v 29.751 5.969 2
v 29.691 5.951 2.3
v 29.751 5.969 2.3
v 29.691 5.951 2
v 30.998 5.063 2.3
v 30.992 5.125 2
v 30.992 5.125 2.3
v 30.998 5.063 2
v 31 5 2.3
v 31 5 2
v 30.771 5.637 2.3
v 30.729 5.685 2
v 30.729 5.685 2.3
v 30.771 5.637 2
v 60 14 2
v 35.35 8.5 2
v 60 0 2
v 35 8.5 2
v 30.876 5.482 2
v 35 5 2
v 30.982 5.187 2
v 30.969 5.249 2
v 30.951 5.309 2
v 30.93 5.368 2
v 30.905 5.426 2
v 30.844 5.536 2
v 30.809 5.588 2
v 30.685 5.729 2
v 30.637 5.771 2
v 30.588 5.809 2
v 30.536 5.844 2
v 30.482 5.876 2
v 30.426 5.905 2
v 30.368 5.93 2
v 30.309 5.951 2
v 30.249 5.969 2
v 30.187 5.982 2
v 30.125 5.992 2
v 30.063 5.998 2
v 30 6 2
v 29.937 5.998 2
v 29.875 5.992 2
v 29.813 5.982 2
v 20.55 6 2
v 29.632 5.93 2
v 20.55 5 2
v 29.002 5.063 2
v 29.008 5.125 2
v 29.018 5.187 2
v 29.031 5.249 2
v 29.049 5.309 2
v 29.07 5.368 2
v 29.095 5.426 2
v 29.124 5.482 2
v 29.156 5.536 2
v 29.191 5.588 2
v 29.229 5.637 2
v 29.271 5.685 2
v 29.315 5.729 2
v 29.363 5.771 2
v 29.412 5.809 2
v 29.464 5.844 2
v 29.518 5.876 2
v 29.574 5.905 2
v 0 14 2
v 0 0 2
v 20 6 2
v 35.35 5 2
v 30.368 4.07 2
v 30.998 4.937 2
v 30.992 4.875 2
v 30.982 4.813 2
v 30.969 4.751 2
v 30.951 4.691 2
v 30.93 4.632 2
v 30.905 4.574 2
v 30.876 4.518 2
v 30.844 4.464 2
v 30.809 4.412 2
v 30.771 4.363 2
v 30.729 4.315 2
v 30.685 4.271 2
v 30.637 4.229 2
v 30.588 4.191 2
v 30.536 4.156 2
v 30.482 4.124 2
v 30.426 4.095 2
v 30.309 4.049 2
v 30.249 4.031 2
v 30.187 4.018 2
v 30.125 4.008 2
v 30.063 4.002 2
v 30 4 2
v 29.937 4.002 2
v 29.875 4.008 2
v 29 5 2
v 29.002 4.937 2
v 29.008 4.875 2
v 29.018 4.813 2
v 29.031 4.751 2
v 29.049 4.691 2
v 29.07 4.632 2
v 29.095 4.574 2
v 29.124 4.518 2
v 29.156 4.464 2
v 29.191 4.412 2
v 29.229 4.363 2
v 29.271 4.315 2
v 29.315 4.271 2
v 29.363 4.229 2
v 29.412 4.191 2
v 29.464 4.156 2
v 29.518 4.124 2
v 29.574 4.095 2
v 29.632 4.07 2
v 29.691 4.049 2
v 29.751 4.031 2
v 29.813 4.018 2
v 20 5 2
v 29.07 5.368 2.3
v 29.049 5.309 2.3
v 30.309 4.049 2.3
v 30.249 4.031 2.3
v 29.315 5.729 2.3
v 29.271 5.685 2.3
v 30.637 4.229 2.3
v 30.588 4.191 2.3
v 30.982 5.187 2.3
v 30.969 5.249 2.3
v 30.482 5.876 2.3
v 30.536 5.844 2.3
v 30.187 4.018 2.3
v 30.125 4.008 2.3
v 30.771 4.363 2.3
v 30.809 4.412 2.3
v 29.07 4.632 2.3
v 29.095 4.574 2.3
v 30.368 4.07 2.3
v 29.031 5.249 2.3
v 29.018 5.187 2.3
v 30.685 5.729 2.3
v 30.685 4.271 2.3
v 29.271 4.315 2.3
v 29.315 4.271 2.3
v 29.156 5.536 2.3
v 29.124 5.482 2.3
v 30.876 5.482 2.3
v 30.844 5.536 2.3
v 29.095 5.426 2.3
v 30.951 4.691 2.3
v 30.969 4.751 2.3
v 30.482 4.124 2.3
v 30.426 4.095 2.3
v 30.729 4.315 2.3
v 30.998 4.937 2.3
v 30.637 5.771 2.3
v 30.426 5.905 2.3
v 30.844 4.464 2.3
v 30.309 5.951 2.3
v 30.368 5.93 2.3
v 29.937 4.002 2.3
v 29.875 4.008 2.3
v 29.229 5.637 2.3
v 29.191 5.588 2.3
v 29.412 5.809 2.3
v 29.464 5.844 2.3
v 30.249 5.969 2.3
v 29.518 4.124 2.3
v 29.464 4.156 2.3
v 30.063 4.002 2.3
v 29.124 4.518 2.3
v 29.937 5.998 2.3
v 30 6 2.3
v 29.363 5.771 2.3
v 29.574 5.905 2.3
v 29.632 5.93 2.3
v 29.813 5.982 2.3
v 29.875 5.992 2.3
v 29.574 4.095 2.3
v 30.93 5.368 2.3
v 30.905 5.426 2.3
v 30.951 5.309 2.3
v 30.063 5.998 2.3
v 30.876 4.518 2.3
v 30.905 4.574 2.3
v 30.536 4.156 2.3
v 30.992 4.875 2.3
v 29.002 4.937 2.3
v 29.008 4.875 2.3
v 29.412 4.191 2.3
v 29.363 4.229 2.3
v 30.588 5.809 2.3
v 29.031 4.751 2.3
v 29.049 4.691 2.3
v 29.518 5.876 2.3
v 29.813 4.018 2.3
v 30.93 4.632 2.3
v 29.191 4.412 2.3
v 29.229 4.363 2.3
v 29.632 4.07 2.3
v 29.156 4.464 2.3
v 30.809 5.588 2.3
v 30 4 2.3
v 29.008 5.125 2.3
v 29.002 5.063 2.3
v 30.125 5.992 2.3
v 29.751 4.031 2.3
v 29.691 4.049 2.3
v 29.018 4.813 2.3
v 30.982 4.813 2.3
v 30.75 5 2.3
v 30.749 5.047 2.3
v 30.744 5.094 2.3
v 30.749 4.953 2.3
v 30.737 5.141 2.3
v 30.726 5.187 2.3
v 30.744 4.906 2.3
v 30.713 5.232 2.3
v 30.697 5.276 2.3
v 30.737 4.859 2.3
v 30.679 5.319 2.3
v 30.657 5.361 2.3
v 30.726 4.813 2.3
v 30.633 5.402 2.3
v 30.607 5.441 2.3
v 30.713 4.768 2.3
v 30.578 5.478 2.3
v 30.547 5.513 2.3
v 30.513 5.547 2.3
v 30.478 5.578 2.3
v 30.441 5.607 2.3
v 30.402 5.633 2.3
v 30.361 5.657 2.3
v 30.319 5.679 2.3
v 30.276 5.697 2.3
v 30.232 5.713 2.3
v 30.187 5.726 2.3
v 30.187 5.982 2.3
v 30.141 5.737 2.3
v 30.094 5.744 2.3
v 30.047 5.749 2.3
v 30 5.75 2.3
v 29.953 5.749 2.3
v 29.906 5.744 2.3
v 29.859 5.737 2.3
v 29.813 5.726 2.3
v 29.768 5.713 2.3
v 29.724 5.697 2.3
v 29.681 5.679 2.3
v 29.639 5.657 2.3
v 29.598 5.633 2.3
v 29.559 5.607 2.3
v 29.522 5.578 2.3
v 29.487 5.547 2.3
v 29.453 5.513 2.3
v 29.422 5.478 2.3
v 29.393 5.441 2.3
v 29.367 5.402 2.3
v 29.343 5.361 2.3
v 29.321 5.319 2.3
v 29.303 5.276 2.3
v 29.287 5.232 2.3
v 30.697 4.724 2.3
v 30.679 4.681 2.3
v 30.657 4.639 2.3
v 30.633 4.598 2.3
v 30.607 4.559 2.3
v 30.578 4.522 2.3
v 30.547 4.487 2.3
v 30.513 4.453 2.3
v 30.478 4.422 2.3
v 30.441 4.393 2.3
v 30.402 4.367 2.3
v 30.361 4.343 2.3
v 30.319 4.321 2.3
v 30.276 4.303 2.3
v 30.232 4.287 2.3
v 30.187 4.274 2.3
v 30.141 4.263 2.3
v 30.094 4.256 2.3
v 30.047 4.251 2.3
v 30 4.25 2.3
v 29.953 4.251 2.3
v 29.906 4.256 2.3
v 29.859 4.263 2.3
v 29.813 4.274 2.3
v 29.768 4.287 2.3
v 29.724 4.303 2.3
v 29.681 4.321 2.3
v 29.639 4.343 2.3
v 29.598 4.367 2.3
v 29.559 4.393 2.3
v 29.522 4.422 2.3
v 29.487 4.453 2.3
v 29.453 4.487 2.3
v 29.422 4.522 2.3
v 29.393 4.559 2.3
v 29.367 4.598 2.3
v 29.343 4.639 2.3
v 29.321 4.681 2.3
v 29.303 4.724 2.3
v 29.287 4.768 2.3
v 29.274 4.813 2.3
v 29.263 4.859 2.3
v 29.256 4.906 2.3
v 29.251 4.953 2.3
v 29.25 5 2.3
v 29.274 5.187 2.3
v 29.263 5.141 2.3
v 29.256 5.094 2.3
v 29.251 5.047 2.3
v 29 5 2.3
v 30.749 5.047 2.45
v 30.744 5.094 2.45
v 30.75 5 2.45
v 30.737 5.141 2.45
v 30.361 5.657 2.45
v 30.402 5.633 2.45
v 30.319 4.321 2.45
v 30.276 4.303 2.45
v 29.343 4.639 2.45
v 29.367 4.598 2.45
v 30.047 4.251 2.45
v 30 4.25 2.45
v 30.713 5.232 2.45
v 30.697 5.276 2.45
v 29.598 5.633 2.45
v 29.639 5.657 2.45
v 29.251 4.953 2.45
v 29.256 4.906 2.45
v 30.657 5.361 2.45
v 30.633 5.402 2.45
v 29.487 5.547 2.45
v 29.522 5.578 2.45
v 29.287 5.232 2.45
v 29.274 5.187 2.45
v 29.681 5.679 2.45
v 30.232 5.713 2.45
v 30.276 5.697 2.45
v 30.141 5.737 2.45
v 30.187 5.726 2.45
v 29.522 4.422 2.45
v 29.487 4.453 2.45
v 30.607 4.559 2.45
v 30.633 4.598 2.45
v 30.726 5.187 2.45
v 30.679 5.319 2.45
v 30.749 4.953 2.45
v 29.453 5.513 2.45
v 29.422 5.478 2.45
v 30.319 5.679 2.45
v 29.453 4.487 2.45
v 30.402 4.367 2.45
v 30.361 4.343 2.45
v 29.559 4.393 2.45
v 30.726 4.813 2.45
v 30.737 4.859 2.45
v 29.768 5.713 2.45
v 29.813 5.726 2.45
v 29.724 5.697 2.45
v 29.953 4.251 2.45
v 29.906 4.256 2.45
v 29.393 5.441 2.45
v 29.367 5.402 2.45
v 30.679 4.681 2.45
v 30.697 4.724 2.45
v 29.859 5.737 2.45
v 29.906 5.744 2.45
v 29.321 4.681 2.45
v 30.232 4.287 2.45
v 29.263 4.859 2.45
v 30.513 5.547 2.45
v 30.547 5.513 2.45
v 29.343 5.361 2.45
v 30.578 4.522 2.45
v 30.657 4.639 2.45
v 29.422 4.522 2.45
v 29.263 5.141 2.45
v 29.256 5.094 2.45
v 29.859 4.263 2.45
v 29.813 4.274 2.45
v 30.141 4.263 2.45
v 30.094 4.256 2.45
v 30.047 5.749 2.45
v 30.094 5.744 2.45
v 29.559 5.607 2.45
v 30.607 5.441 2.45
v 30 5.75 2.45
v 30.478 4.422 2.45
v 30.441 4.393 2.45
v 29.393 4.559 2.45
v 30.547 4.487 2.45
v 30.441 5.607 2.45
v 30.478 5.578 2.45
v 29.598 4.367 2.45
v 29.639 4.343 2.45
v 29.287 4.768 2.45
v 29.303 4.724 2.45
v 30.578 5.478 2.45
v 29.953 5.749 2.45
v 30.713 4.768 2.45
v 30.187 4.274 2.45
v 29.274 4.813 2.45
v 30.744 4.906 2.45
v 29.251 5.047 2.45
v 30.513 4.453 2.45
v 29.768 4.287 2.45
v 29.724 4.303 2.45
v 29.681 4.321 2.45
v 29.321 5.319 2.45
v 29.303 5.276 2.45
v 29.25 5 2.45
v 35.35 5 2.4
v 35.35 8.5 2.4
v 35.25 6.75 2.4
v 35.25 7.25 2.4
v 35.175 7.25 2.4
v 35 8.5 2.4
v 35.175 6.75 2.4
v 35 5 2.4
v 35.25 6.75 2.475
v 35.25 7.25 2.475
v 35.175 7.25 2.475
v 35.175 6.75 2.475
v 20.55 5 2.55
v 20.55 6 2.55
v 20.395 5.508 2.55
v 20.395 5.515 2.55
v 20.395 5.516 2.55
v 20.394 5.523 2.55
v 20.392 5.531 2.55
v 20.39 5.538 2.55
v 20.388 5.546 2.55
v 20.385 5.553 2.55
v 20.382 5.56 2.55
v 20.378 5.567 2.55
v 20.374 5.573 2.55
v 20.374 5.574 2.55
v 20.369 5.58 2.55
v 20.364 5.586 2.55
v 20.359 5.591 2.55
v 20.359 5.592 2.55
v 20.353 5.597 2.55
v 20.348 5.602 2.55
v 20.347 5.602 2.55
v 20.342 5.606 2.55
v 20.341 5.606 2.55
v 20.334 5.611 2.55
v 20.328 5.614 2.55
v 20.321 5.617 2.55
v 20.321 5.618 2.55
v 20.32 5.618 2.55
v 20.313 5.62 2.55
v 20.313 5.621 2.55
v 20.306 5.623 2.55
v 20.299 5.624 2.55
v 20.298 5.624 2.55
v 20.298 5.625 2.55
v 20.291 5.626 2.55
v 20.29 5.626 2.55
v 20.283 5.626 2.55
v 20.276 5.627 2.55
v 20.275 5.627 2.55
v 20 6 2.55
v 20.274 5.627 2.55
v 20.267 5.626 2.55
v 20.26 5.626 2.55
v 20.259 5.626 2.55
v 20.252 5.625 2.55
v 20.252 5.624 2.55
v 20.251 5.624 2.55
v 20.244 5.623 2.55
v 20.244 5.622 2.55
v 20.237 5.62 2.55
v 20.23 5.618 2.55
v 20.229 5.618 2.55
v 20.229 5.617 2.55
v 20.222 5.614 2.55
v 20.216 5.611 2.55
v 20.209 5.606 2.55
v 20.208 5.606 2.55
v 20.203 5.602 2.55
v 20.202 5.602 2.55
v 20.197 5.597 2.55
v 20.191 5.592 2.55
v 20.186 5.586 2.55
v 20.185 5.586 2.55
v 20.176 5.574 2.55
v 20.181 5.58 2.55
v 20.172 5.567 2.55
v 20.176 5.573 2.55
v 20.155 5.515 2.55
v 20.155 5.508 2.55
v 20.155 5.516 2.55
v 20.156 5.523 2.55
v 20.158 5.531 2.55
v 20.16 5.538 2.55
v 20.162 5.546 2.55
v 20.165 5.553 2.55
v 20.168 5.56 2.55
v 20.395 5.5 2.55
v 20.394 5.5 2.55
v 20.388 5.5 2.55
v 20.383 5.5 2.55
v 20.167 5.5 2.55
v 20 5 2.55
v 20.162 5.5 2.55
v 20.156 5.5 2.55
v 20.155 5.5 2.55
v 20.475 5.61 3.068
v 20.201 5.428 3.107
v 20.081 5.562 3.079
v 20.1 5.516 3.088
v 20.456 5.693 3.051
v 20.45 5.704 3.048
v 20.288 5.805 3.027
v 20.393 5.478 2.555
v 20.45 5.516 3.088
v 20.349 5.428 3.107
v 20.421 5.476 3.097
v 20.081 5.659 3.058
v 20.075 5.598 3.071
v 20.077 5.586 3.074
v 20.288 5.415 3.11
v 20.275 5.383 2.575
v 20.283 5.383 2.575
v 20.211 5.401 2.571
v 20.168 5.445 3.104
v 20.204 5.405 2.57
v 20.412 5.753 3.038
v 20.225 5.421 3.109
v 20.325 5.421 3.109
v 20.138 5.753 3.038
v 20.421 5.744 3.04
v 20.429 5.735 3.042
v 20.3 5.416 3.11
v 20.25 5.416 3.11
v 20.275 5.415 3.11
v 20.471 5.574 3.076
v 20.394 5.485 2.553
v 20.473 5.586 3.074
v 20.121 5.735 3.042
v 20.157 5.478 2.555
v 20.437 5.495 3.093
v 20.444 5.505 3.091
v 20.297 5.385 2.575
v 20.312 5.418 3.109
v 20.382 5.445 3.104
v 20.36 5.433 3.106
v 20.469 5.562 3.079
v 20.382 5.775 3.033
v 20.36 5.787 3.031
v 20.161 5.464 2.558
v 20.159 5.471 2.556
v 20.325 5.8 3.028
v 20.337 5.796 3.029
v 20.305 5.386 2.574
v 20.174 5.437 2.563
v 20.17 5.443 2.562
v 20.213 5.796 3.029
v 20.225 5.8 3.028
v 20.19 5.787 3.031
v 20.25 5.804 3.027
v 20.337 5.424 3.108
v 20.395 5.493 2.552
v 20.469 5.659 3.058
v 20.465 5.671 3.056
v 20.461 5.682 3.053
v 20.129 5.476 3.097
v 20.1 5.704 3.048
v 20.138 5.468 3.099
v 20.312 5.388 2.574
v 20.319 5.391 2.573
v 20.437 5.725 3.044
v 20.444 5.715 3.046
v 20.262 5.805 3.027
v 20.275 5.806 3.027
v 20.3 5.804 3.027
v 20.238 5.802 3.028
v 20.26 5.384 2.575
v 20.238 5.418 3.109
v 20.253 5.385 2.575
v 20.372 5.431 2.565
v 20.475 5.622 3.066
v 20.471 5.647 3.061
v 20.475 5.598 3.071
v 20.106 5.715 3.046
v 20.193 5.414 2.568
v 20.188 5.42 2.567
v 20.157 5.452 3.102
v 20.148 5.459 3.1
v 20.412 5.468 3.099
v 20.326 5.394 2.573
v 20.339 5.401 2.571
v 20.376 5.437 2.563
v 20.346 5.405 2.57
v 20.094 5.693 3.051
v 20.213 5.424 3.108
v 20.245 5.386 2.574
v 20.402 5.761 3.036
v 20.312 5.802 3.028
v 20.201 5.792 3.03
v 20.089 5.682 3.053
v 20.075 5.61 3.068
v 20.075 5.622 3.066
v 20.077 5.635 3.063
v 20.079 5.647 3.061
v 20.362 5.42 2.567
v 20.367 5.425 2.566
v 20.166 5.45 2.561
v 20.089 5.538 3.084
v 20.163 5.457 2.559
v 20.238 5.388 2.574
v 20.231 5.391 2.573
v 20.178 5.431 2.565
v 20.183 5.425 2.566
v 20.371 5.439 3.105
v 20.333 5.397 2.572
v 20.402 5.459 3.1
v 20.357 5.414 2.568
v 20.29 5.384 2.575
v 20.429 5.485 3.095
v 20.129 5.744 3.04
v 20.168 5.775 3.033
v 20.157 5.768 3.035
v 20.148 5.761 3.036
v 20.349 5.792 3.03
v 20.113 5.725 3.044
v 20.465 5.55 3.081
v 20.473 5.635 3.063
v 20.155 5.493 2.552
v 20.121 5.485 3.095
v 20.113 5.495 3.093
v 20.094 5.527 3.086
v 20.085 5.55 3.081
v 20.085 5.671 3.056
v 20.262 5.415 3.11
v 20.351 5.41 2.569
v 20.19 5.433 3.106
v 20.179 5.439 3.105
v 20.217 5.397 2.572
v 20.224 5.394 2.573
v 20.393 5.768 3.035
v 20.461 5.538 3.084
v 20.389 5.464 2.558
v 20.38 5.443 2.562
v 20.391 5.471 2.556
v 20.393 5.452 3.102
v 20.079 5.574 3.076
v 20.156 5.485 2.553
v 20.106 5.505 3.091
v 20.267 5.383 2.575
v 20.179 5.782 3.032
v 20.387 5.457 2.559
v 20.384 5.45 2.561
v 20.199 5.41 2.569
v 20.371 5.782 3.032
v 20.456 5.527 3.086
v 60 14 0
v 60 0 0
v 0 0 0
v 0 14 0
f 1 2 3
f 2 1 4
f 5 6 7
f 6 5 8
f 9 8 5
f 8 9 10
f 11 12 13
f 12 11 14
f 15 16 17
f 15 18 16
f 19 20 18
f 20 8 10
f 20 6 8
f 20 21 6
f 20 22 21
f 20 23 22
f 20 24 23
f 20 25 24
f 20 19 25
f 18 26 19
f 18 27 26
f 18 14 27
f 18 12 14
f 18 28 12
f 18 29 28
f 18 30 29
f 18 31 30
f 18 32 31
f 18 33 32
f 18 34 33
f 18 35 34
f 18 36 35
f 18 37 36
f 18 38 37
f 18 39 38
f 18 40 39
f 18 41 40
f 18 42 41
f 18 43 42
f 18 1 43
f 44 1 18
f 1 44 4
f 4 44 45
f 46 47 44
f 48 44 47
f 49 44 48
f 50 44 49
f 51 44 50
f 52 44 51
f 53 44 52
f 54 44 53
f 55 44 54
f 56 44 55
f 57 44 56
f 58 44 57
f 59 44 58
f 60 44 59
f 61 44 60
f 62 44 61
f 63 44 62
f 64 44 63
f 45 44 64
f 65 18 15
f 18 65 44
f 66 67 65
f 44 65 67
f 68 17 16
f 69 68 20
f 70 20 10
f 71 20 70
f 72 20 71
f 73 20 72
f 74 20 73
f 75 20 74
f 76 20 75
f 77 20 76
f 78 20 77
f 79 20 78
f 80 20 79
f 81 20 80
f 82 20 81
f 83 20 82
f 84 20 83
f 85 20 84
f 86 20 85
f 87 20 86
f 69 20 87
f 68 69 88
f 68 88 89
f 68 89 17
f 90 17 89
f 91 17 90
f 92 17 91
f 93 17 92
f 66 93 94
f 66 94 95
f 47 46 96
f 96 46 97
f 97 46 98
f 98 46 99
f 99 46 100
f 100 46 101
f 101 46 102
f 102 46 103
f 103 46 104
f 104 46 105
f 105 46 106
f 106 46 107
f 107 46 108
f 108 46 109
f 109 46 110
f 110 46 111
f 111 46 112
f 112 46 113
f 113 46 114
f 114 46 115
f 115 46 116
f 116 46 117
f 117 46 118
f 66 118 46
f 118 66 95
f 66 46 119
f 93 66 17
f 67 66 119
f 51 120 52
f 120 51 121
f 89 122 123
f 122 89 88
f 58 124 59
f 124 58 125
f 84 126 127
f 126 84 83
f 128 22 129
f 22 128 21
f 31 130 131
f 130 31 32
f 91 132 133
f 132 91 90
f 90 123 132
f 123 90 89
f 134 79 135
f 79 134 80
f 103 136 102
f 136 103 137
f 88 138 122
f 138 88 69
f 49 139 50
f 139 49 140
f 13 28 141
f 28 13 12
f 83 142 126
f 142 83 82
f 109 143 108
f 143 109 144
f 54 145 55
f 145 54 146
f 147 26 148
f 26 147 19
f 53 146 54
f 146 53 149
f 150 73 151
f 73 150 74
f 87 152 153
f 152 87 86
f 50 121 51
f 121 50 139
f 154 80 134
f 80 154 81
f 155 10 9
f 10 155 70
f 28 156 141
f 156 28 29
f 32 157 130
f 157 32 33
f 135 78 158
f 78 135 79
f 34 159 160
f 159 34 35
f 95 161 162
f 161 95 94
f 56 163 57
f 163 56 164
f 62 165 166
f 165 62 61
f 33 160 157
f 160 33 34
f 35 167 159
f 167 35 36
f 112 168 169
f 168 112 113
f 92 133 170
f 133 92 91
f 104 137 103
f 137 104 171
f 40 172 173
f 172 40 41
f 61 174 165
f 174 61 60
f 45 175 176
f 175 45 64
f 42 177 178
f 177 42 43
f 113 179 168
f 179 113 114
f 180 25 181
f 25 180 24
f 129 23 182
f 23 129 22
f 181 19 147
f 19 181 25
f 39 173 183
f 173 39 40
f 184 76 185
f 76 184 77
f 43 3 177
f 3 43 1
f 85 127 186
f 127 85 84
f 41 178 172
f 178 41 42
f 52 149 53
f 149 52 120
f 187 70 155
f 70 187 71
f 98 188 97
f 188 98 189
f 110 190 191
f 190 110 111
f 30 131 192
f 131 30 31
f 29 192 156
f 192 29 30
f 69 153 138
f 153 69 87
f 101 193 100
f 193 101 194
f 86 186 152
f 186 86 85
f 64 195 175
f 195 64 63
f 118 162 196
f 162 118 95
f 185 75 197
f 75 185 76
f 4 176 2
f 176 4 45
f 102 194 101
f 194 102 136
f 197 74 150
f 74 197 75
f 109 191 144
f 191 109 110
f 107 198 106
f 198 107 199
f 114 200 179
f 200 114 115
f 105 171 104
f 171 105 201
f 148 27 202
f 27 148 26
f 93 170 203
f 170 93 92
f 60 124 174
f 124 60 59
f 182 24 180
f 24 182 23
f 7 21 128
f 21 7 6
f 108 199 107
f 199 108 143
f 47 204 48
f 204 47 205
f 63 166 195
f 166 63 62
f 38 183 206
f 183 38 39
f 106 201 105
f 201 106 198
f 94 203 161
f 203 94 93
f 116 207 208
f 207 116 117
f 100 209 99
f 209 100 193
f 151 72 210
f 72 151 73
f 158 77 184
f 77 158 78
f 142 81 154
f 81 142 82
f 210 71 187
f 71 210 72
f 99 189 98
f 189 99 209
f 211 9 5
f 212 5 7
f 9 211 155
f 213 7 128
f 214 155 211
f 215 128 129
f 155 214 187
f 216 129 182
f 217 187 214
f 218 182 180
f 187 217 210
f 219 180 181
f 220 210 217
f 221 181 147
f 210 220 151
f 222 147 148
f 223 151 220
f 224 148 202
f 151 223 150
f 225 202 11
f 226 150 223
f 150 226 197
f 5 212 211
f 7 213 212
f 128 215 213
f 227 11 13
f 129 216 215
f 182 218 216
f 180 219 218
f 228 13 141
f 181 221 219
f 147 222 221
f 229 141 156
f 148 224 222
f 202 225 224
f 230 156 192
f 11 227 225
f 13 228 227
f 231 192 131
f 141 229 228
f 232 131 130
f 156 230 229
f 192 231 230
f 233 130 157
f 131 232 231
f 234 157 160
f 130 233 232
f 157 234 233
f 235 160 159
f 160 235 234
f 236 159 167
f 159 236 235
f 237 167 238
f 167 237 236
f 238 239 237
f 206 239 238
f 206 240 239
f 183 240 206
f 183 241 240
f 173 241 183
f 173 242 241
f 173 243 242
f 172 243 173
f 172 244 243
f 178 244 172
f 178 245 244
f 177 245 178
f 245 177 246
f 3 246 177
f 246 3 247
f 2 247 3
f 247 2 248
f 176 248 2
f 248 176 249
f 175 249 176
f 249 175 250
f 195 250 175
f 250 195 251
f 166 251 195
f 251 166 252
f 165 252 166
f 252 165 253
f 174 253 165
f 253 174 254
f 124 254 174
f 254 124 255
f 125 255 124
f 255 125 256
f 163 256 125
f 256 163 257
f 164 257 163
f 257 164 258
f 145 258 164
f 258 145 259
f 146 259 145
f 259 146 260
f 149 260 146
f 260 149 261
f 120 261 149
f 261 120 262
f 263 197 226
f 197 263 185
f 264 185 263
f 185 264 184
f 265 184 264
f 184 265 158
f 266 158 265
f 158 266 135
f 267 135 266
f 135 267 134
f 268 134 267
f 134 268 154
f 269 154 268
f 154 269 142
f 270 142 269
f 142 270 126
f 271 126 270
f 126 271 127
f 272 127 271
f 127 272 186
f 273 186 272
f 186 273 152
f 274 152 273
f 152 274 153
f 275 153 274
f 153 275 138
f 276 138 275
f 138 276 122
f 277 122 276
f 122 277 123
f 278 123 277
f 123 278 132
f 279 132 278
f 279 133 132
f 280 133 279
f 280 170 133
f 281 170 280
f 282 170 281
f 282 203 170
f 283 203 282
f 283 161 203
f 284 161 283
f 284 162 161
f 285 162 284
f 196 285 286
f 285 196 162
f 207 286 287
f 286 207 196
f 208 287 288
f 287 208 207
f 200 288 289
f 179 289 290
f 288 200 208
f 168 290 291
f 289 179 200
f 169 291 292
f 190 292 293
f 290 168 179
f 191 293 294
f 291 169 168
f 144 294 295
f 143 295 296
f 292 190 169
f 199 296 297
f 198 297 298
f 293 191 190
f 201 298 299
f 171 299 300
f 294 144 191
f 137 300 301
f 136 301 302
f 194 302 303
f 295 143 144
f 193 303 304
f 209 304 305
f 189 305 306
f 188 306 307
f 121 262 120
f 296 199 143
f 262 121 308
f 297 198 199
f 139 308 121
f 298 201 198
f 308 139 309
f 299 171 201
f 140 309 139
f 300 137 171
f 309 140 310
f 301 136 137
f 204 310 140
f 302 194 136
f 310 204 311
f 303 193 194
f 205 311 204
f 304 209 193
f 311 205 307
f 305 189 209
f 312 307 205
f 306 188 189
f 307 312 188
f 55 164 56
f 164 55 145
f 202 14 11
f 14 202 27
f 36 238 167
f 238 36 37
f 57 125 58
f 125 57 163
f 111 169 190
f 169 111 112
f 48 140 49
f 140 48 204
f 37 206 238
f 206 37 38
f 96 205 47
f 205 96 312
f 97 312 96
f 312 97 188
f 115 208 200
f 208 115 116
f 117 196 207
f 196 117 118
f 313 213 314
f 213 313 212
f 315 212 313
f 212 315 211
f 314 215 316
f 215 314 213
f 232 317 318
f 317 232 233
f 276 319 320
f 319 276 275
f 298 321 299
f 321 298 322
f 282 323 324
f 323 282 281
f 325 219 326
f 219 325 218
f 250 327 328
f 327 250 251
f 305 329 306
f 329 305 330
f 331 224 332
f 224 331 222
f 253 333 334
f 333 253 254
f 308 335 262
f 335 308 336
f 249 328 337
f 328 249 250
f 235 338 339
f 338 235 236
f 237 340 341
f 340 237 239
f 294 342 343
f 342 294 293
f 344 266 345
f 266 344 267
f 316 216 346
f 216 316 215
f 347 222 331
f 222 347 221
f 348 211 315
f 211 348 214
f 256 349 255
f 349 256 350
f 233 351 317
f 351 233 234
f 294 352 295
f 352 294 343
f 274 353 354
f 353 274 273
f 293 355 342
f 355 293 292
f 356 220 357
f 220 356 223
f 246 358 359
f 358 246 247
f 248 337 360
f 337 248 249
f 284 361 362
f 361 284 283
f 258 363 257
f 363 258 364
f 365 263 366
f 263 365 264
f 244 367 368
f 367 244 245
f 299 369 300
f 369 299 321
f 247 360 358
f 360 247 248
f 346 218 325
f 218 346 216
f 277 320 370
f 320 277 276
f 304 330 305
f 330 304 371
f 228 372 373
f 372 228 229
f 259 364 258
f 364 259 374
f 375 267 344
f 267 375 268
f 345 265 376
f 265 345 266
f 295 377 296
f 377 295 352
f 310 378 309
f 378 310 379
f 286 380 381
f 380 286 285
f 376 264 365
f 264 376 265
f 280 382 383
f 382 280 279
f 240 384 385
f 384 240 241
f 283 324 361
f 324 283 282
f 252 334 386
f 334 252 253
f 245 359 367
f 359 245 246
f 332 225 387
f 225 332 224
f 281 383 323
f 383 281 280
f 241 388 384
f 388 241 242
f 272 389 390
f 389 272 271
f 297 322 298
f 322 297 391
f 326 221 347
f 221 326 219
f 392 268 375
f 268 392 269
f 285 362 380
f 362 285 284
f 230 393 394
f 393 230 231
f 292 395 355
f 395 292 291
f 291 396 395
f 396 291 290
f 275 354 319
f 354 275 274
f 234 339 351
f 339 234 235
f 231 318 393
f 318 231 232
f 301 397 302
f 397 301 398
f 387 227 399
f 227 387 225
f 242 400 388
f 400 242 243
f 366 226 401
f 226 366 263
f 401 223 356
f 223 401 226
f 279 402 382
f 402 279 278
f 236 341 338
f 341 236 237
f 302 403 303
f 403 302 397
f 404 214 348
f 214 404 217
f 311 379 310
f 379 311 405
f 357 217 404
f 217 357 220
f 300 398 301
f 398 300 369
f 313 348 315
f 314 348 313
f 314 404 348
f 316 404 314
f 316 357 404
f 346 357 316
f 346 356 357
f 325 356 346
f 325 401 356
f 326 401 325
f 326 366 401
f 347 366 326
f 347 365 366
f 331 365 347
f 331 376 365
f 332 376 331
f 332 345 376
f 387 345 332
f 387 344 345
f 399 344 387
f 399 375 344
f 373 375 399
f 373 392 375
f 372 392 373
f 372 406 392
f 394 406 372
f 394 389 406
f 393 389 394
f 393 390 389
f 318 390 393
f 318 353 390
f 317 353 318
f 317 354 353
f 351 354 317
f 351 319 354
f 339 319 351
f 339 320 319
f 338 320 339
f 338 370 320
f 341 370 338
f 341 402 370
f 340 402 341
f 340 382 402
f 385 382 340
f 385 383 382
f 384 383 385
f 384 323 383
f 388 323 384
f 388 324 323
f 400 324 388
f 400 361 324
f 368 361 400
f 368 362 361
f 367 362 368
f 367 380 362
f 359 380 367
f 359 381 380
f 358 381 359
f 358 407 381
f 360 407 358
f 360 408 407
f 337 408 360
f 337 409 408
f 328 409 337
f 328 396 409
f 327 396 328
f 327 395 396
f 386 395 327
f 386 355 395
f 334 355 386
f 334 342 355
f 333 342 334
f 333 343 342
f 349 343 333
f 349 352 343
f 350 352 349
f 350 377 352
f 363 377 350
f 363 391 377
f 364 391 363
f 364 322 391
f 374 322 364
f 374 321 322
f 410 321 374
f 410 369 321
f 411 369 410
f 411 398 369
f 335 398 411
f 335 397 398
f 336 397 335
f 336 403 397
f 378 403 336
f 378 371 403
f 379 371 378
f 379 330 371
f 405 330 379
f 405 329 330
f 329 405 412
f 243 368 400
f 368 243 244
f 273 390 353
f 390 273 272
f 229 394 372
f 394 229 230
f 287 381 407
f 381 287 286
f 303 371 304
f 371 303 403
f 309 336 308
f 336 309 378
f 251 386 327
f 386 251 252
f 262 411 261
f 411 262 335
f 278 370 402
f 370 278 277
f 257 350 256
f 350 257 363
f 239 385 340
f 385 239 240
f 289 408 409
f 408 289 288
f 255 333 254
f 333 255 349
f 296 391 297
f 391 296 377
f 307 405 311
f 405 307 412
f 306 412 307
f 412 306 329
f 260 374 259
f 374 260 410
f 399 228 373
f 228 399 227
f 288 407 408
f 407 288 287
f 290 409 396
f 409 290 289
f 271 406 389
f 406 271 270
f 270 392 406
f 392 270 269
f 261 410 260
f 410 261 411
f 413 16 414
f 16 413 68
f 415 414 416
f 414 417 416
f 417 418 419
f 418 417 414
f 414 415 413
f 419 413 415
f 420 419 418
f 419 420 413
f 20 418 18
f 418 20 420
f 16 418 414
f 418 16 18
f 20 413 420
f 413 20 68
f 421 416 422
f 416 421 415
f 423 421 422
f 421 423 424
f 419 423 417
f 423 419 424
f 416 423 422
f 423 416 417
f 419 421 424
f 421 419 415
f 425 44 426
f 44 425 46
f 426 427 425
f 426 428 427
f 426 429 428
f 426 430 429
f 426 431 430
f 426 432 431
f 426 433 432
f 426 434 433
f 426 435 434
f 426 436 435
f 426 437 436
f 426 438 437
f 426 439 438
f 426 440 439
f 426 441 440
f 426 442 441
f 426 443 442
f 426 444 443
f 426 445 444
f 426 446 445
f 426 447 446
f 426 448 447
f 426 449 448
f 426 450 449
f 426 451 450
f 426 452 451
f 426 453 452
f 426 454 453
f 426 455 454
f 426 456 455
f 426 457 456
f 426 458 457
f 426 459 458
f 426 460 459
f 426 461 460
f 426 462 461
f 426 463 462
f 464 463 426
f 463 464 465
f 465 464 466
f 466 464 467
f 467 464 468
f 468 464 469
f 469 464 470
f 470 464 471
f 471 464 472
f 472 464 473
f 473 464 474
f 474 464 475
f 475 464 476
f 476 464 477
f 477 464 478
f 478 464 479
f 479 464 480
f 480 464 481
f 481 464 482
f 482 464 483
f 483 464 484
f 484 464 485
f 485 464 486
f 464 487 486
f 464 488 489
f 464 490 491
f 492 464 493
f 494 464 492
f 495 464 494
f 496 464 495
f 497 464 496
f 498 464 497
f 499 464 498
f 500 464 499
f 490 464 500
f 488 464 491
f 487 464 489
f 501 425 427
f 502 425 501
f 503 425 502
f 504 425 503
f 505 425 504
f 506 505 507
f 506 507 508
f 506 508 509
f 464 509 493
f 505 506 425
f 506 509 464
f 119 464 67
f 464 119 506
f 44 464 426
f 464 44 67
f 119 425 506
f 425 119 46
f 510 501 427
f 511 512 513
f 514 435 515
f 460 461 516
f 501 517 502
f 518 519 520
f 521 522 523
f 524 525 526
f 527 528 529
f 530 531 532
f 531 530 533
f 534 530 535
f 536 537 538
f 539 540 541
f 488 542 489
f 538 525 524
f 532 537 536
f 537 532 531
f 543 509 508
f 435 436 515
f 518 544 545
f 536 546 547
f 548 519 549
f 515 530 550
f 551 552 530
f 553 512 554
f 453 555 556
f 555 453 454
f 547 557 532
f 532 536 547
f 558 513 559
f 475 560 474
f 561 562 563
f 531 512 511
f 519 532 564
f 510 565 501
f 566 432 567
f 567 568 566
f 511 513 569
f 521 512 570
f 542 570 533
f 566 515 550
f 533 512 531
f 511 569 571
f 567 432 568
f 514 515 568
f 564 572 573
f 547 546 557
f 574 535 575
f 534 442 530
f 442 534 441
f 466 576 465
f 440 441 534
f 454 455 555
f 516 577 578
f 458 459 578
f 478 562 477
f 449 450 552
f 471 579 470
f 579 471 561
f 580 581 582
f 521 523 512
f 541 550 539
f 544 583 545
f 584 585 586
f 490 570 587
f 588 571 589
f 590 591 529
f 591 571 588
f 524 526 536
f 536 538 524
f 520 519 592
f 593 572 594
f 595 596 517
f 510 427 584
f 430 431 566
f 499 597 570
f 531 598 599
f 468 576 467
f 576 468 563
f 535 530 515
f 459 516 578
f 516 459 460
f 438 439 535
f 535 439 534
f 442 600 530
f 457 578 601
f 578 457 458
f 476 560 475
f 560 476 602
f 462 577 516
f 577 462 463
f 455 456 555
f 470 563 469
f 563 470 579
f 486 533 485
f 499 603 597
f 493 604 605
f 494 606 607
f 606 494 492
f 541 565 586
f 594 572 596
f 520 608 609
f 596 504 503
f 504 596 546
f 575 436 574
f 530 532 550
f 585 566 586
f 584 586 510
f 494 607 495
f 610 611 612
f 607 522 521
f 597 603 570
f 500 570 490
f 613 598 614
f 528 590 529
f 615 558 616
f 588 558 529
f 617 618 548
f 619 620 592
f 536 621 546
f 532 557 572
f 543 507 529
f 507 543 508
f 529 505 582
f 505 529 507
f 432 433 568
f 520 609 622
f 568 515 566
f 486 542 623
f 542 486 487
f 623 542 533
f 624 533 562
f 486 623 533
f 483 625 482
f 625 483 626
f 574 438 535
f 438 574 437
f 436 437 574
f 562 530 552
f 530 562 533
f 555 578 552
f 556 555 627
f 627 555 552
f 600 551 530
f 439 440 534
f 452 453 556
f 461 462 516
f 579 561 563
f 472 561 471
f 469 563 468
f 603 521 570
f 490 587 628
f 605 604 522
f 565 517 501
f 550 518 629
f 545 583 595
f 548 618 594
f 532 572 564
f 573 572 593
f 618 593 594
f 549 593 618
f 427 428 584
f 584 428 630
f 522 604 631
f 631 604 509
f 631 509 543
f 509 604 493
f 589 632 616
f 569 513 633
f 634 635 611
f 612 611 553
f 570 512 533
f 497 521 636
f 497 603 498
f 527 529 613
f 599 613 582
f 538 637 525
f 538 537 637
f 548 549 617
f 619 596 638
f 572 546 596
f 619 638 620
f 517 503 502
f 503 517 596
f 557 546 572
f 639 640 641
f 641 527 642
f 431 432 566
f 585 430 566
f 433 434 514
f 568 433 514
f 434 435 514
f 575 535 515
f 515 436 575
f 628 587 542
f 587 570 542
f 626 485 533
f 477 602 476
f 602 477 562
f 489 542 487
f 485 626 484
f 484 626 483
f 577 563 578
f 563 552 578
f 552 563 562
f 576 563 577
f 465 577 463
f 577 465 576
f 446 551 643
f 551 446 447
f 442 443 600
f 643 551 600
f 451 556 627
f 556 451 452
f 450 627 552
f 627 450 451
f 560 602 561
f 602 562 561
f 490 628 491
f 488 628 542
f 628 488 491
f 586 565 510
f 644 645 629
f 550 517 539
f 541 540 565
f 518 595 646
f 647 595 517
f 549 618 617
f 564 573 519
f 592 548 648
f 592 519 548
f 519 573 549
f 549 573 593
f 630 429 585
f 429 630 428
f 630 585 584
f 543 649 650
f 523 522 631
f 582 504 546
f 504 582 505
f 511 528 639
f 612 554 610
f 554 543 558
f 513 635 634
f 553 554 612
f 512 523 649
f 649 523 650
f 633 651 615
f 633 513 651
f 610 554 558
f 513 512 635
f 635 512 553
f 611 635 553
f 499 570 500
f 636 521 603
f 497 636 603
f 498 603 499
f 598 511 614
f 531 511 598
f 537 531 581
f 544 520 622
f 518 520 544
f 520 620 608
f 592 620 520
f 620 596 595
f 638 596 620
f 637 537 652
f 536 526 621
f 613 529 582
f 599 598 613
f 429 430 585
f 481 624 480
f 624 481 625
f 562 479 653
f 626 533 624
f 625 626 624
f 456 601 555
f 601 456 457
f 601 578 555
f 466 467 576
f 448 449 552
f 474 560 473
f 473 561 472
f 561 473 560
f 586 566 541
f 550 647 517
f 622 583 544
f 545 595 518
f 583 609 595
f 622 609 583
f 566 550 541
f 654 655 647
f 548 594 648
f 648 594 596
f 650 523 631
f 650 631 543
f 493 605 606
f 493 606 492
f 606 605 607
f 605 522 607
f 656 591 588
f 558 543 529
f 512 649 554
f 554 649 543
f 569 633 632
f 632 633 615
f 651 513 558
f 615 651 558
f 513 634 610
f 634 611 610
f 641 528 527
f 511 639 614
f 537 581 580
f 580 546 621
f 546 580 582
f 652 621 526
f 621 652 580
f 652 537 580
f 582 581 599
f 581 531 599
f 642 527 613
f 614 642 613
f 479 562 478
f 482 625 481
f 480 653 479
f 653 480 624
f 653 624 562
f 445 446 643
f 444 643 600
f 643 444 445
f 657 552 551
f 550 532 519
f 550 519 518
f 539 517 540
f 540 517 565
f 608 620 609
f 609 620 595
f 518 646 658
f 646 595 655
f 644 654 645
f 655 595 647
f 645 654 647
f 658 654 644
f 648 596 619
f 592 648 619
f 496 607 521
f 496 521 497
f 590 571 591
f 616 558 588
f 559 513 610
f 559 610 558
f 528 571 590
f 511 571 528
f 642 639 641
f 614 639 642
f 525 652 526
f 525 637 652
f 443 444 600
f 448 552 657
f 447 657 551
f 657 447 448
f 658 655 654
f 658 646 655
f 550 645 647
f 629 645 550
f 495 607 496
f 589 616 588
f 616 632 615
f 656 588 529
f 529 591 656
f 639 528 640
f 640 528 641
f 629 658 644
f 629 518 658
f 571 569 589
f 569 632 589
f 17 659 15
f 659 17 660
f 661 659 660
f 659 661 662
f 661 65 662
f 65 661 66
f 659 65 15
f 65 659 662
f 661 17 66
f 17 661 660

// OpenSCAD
module board() {
    cube([60, 14, 2]);
}
module slider(location) {
    translate([location[0], location[1], 2]) {
        color("DimGray")
        cube([0.35, 3.5, 0.4]);
    }
    translate([location[0] + 0.35/2, location[1] + 3.5/2, 2.4]) {
        color("Silver")
        cube([0.075, 0.5, 0.075]);
    }
}
module button(color, location) {
    translate([location[0], location[1], 2]) {
        color(color)
        cylinder(0.3, 1, 1, $fn = 100);
    }
    translate([location[0], location[1], 2.3]) {
        color(color)
        cylinder(0.15, 0.75, 0.75, $fn = 100);
    }
}
module rocker(location) {
    translate([location[0], location[1], 2]) {
        color("Silver")
        cube([0.55, 1, 0.55]);
    }
    translate([location[0] + 0.55/2, location[1] + 1/2, 2.55]) {
        color("Silver")
        rotate([-12, 0, 0])
        cylinder(0.53, 0.12, 0.2, $fn = 100);
    }
}
module joystick(location) {
    
}
module laptop(location) {
    
}

board();
button("Red", [30, 5]);
slider([35, 5]);
rocker([20, 5]);
